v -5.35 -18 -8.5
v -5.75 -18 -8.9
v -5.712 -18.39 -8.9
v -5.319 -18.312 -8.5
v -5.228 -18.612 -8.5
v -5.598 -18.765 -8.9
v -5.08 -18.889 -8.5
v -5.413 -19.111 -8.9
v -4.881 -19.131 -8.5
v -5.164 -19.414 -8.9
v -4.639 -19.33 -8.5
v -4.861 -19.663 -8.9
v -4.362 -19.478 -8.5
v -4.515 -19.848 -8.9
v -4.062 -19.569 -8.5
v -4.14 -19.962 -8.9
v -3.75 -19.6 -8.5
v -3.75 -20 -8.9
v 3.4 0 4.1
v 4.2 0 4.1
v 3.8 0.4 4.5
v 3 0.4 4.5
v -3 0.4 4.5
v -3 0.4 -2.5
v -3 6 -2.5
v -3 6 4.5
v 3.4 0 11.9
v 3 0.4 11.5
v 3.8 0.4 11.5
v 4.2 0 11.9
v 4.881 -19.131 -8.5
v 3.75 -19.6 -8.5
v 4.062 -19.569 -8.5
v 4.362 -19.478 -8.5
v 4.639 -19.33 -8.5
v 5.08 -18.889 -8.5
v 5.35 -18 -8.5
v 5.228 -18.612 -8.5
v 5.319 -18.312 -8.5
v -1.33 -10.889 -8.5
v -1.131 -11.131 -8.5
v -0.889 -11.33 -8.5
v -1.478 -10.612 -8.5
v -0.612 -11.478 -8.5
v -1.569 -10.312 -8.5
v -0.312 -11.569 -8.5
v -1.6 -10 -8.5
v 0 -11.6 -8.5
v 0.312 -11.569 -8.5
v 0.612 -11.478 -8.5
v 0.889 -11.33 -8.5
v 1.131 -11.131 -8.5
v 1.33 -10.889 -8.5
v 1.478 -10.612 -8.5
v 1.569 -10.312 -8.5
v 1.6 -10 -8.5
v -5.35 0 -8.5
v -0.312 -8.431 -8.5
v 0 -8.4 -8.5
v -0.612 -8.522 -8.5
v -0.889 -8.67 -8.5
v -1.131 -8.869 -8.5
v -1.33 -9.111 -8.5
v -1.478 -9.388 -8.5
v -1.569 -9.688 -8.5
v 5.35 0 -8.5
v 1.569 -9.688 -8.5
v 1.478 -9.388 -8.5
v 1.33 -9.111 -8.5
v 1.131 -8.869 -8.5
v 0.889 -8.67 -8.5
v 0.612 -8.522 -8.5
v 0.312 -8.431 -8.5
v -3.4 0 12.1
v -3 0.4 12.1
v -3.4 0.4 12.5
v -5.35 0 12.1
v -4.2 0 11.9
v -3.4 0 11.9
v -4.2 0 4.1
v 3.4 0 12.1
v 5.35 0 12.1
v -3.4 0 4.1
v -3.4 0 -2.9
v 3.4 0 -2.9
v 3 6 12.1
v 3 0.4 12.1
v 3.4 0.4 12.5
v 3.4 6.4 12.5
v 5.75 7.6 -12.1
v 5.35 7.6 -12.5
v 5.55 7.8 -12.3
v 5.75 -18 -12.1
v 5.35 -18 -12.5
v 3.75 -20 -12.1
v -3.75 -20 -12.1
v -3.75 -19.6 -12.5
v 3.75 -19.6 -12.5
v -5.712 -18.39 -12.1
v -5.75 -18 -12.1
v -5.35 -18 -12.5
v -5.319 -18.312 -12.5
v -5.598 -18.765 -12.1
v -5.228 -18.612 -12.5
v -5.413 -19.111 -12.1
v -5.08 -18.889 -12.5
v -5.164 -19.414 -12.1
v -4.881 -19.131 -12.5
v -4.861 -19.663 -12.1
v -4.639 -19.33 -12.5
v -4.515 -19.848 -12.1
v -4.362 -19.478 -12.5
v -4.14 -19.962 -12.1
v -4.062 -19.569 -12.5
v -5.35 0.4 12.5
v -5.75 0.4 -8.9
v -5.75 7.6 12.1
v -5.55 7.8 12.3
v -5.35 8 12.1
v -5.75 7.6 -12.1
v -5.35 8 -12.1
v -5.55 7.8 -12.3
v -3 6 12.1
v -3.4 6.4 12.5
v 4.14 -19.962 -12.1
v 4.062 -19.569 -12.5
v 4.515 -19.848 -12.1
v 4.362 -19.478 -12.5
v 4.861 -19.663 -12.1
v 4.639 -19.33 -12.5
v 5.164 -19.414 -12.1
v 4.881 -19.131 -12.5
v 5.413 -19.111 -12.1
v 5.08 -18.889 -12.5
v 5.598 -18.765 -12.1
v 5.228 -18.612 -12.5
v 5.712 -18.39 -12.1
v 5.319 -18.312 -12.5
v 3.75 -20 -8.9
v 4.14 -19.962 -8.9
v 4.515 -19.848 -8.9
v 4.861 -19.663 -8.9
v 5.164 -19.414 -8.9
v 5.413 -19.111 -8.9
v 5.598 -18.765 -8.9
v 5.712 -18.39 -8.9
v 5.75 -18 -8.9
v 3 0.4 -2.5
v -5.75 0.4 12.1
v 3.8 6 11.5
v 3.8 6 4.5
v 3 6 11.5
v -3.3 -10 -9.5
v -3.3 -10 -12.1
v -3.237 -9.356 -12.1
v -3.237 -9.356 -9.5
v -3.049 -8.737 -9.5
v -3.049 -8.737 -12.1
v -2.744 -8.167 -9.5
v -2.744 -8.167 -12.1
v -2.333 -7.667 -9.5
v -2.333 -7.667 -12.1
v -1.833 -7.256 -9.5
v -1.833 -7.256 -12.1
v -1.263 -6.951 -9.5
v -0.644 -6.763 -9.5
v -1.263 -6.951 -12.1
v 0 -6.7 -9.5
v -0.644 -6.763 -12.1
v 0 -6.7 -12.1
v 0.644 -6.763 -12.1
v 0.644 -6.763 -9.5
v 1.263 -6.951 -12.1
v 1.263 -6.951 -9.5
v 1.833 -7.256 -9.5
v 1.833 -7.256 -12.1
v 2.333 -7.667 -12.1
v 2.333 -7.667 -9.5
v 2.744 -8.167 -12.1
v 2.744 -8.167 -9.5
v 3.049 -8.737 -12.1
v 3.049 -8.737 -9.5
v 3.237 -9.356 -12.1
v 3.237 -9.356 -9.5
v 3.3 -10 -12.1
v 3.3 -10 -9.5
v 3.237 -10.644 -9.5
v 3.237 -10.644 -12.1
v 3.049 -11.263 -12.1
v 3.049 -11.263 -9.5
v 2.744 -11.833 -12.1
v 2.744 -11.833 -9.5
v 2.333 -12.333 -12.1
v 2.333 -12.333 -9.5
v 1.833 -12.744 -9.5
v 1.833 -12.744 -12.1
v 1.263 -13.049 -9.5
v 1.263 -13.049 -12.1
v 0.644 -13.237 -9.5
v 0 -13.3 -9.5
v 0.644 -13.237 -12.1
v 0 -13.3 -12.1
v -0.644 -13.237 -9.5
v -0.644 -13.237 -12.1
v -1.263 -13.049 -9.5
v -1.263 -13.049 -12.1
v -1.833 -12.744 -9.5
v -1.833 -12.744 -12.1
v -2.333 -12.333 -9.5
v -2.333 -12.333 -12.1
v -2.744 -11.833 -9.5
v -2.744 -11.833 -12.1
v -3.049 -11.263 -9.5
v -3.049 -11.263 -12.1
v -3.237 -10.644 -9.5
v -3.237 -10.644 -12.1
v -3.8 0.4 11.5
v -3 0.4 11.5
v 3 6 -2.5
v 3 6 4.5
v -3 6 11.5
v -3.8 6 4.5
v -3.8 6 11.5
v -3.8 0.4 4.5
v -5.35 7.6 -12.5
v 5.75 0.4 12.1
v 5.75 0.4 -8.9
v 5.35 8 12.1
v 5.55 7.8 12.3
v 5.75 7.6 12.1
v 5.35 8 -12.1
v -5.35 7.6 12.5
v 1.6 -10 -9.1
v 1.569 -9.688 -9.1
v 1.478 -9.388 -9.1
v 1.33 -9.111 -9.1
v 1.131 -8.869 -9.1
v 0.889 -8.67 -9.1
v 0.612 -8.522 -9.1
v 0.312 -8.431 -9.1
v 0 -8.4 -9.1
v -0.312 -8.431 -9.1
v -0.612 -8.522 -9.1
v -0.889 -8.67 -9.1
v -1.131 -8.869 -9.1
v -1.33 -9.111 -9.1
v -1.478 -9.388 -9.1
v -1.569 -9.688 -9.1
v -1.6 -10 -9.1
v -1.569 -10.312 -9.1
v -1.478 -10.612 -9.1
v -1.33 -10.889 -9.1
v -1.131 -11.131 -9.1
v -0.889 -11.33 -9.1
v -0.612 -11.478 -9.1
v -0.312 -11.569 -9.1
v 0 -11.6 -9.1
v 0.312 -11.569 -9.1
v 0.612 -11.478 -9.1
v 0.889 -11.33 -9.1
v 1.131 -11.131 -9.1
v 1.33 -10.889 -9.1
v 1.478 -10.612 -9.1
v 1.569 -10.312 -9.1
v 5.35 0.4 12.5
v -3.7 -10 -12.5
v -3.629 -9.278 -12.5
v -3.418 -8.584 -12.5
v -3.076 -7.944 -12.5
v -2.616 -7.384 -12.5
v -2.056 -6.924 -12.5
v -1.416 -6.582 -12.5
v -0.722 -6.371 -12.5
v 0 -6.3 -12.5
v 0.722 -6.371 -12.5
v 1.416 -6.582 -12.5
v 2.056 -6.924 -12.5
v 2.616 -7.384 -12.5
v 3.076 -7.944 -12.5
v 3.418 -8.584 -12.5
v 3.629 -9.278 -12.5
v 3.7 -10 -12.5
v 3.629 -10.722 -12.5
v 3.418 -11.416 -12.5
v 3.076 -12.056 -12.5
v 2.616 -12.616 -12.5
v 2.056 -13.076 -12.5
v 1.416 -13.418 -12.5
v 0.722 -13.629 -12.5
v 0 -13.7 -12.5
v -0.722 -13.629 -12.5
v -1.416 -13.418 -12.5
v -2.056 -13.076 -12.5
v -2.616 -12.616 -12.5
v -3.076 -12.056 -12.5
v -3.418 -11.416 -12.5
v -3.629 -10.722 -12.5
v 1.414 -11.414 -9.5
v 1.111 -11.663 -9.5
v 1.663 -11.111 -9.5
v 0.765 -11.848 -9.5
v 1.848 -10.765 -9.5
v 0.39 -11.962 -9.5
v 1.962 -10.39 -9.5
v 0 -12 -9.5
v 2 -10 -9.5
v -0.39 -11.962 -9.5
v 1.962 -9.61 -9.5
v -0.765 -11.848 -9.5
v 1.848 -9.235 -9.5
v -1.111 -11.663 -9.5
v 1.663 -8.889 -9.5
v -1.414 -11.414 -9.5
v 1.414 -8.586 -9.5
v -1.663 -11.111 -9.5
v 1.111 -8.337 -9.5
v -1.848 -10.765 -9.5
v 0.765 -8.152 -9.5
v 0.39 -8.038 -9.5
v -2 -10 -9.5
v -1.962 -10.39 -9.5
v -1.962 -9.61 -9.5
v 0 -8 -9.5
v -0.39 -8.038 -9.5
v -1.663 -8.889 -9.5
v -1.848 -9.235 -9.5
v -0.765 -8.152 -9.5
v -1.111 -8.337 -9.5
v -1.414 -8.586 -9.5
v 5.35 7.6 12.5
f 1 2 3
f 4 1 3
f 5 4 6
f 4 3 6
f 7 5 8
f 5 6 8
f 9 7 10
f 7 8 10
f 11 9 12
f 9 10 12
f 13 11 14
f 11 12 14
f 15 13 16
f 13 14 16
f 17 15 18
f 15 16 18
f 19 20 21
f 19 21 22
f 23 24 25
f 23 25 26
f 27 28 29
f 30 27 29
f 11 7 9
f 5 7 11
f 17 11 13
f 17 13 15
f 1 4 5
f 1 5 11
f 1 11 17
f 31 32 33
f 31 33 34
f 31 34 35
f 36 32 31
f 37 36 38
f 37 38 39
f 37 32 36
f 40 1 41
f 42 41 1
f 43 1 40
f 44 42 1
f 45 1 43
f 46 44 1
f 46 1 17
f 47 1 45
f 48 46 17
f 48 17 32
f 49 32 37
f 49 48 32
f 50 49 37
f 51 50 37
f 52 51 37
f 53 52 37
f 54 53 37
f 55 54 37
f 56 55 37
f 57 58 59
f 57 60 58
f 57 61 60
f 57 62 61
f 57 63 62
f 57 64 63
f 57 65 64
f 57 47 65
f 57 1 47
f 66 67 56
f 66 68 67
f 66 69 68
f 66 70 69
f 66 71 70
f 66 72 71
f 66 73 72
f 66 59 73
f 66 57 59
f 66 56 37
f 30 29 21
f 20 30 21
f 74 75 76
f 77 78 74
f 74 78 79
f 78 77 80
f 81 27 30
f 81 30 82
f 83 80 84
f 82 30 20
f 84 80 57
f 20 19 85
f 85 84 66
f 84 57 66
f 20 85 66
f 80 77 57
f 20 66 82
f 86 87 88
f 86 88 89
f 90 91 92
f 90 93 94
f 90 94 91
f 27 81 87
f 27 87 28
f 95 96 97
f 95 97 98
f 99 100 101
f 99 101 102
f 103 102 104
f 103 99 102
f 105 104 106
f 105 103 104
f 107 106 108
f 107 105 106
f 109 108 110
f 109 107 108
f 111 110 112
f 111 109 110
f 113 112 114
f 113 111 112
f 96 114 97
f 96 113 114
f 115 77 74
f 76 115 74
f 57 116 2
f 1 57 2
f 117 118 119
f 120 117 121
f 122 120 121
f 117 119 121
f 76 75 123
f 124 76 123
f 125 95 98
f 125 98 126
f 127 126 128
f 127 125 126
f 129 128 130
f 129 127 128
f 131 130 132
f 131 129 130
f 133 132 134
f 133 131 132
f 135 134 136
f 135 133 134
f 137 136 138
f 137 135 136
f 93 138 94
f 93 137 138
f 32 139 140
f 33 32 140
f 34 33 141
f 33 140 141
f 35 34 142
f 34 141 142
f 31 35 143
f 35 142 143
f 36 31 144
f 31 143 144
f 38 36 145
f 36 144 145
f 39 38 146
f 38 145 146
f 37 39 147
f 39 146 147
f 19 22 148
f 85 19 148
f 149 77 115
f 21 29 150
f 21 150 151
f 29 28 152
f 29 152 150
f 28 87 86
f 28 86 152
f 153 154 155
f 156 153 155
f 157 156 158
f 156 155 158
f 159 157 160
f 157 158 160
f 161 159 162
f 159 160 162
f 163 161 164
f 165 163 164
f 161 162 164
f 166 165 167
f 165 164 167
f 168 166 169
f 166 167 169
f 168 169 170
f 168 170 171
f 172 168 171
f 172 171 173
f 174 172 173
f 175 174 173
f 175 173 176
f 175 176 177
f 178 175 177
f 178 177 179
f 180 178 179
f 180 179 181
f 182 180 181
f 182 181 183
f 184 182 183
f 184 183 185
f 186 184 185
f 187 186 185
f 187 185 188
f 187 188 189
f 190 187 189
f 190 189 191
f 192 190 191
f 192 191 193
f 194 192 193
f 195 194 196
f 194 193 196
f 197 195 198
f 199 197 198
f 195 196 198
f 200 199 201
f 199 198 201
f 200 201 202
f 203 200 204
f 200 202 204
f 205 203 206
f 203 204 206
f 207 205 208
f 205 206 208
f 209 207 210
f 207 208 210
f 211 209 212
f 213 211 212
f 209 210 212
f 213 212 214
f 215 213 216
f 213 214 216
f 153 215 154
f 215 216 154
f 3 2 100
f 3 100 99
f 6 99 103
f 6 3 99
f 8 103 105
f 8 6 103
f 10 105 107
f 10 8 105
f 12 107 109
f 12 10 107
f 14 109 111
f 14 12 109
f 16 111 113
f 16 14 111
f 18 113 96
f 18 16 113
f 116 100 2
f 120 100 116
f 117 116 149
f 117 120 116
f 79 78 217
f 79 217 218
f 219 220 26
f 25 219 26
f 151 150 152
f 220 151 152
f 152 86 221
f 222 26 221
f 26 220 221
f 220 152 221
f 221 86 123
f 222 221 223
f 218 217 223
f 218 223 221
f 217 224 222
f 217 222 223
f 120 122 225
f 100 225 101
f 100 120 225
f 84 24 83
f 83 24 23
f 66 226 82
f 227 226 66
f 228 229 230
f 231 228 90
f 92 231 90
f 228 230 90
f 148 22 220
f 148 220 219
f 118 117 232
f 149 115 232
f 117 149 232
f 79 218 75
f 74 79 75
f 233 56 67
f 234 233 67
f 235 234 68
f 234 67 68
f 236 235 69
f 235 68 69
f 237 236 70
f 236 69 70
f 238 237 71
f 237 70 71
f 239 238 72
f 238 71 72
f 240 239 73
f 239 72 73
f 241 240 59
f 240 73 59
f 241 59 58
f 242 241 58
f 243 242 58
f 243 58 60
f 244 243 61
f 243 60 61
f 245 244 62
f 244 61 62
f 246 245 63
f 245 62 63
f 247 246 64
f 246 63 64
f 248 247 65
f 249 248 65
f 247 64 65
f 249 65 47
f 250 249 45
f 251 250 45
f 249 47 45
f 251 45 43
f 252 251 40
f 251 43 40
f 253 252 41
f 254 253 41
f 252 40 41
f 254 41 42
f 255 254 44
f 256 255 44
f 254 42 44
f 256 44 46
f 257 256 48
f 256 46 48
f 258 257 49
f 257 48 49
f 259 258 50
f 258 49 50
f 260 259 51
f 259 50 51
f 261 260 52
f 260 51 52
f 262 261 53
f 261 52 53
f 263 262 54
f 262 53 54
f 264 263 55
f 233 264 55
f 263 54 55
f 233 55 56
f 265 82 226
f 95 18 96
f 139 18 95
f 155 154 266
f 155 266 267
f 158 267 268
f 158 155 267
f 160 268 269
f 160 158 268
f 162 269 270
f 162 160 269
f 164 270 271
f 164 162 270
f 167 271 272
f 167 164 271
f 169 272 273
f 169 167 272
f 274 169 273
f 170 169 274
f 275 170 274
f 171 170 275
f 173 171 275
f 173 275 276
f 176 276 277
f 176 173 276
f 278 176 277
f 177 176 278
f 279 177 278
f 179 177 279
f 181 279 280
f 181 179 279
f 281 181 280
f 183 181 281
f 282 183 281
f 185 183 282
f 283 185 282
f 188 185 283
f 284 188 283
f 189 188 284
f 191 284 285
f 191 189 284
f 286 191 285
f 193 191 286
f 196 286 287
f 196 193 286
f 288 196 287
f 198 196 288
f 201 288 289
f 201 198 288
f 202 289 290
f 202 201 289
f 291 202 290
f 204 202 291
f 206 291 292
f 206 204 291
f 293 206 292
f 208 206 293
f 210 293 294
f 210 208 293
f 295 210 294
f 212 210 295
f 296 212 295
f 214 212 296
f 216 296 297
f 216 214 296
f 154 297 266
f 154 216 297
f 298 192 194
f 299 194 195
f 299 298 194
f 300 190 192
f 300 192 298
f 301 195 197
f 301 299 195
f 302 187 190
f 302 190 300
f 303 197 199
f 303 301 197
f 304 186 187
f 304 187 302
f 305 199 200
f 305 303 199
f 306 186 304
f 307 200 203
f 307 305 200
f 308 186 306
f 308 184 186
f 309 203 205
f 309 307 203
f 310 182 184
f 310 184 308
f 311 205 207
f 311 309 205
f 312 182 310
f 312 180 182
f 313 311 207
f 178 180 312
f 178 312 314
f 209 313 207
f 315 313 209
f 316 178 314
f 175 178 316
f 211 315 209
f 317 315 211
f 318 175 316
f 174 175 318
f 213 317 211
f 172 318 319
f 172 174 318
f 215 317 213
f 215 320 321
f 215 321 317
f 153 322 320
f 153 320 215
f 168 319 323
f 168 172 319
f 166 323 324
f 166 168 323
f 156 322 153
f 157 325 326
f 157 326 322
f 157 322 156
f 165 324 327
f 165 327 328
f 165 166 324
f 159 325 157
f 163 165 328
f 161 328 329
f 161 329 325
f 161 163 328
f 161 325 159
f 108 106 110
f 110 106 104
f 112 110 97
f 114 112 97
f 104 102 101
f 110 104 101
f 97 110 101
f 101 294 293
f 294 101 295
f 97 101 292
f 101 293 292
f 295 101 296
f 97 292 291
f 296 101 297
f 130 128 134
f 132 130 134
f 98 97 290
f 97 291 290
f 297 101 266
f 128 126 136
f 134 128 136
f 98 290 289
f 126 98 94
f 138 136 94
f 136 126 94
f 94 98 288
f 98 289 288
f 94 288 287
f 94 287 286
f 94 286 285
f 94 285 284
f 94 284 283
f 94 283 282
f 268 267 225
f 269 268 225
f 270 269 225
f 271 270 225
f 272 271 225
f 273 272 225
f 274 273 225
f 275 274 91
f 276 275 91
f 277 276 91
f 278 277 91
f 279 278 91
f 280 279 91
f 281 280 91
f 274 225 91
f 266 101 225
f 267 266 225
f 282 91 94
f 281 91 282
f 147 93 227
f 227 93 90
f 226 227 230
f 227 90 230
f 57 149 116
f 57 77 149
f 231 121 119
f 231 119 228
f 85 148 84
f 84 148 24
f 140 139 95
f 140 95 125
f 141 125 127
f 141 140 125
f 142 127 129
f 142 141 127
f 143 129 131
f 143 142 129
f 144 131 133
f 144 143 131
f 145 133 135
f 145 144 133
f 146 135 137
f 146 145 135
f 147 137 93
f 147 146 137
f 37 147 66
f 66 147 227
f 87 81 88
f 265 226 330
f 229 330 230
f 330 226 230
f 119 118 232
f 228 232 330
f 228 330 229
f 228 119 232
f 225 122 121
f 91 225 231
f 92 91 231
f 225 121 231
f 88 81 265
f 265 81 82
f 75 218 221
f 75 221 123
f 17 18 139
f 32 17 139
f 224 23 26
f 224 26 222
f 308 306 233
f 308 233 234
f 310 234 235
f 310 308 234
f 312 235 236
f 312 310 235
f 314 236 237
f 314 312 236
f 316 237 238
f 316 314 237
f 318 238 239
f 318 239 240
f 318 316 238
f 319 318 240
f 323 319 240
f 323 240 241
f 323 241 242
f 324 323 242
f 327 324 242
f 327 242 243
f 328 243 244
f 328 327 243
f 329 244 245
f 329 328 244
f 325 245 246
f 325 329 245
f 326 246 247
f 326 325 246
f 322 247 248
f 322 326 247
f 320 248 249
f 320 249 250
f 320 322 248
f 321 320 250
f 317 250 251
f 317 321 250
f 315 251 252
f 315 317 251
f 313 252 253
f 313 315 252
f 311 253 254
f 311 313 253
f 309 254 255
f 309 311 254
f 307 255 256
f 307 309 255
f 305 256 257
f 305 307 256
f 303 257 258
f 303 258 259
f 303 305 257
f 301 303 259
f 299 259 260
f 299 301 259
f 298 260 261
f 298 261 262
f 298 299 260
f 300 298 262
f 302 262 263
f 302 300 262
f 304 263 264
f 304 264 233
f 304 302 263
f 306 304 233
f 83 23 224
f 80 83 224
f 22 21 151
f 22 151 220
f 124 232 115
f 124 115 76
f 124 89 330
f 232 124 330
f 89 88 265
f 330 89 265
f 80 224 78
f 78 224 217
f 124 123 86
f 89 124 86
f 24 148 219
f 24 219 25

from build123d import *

# Parameters (mm, degrees)
SKETCH1_W                      = 11.5
SKETCH1_H                      = 25
BOSS_EXTRUDE1_DEPTH            = 8
CUT_EXTRUDE1_DEPTH             = 6
SKETCH3_W                      = 11.5
SKETCH3_H                      = 4
BOSS_EXTRUDE2_DEPTH            = 20
CBORE_FOR_M3_SHCS1_D           = 3.2
CBORE_FOR_M3_SHCS1_CBORE_D     = 6.6
CBORE_FOR_M3_SHCS1_CBORE_DEPTH = 3
FILLET1_R                      = 2
CHAMFER1_SIZE                  = 0.4
CHAMFER2_SIZE                  = 0.4


with BuildPart() as part:
    # Sketch1 → Boss-Extrude1 (new body)
    with BuildSketch(Plane(origin=(0, 0, 0), x_dir=(1, 0, 0), z_dir=(0, 1, 0))):
        Rectangle(SKETCH1_W, SKETCH1_H)
    extrude(amount=BOSS_EXTRUDE1_DEPTH)

    # Sketch2 → Cut-Extrude1 (cut)
    with BuildSketch(Plane.XZ):
        Polygon((-3, 12.5), (3, 12.5), (3, 11.5), (3.8, 11.5), (3.8, 4.5), (3, 4.5), (3, -2.5), (-3, -2.5), (-3, 4.5), (-3.8, 4.5), (-3.8, 11.5), (-3, 11.5), align=None)
    extrude(amount=-CUT_EXTRUDE1_DEPTH, mode=Mode.SUBTRACT)

    # Sketch3 → Boss-Extrude2 (add)
    with BuildSketch(Plane.XZ):
        with Locations((0, -10.5)):
            Rectangle(SKETCH3_W, SKETCH3_H)
    extrude(amount=BOSS_EXTRUDE2_DEPTH)

    # CBORE for M3 SHCS1 (through all)
    with Locations(Plane(origin=(0, 0, -12.5), x_dir=(-1, 0, 0), z_dir=(0, 0, -1))):
        with Locations((0, -10)):
            CounterBoreHole(CBORE_FOR_M3_SHCS1_D / 2, CBORE_FOR_M3_SHCS1_CBORE_D / 2, CBORE_FOR_M3_SHCS1_CBORE_DEPTH)

    # Fillet1
    fillet1_edges = [part.edges().sort_by_distance(p)[0] for p in [
        (-5.75, -20, -10.5),
        (5.75, -20, -10.5),
    ]]
    fillet(fillet1_edges, radius=FILLET1_R)

    # Chamfer1
    chamfer1_edges = [part.edges().sort_by_distance(p)[0] for p in [
        (5.75, 8, 0),
        (0, 8, -12.5),
        (-5.75, 8, 0),
        (0, 8, 12.5),
    ]]
    chamfer(chamfer1_edges, length=CHAMFER1_SIZE)

    # Chamfer2
    chamfer2_edges = [part.edges().sort_by_distance(p)[0] for p in [
        (4.375, 0, 12.5),
        (-3, 0, 12),
        (-3.4, 0, 11.5),
        (-3.8, 0, 8),
        (-3.4, 0, 4.5),
        (-3, 0, 1),
        (0, 0, -2.5),
        (3, 0, 1),
        (3.4, 0, 4.5),
        (3.8, 0, 8),
        (3.4, 0, 11.5),
        (3, 0, 12),
        (3, 3, 12.5),
        (0, 6, 12.5),
        (-3, 3, 12.5),
        (-5.75, 0, 2),
        (5.75, 0, 2),
        (-4.375, 0, 12.5),
        (3.3, -10, -12.5),
        (-1.6, -10, -9.5),
        (0, -20, -12.5),
        (0, -20, -8.5),
        (5.164213562, -19.414213562, -12.5),
        (-5.164213562, -19.414213562, -12.5),
        (-5.75, -9, -8.5),
        (5.75, -9, -8.5),
        (5.164213562, -19.414213562, -8.5),
        (-5.164213562, -19.414213562, -8.5),
        (-5.75, -5.2, -12.5),
        (5.75, -5.2, -12.5),
        (5.75, 3.8, 12.5),
        (-5.75, 3.8, 12.5),
    ]]
    chamfer(chamfer2_edges, length=CHAMFER2_SIZE)


solid = part.part
